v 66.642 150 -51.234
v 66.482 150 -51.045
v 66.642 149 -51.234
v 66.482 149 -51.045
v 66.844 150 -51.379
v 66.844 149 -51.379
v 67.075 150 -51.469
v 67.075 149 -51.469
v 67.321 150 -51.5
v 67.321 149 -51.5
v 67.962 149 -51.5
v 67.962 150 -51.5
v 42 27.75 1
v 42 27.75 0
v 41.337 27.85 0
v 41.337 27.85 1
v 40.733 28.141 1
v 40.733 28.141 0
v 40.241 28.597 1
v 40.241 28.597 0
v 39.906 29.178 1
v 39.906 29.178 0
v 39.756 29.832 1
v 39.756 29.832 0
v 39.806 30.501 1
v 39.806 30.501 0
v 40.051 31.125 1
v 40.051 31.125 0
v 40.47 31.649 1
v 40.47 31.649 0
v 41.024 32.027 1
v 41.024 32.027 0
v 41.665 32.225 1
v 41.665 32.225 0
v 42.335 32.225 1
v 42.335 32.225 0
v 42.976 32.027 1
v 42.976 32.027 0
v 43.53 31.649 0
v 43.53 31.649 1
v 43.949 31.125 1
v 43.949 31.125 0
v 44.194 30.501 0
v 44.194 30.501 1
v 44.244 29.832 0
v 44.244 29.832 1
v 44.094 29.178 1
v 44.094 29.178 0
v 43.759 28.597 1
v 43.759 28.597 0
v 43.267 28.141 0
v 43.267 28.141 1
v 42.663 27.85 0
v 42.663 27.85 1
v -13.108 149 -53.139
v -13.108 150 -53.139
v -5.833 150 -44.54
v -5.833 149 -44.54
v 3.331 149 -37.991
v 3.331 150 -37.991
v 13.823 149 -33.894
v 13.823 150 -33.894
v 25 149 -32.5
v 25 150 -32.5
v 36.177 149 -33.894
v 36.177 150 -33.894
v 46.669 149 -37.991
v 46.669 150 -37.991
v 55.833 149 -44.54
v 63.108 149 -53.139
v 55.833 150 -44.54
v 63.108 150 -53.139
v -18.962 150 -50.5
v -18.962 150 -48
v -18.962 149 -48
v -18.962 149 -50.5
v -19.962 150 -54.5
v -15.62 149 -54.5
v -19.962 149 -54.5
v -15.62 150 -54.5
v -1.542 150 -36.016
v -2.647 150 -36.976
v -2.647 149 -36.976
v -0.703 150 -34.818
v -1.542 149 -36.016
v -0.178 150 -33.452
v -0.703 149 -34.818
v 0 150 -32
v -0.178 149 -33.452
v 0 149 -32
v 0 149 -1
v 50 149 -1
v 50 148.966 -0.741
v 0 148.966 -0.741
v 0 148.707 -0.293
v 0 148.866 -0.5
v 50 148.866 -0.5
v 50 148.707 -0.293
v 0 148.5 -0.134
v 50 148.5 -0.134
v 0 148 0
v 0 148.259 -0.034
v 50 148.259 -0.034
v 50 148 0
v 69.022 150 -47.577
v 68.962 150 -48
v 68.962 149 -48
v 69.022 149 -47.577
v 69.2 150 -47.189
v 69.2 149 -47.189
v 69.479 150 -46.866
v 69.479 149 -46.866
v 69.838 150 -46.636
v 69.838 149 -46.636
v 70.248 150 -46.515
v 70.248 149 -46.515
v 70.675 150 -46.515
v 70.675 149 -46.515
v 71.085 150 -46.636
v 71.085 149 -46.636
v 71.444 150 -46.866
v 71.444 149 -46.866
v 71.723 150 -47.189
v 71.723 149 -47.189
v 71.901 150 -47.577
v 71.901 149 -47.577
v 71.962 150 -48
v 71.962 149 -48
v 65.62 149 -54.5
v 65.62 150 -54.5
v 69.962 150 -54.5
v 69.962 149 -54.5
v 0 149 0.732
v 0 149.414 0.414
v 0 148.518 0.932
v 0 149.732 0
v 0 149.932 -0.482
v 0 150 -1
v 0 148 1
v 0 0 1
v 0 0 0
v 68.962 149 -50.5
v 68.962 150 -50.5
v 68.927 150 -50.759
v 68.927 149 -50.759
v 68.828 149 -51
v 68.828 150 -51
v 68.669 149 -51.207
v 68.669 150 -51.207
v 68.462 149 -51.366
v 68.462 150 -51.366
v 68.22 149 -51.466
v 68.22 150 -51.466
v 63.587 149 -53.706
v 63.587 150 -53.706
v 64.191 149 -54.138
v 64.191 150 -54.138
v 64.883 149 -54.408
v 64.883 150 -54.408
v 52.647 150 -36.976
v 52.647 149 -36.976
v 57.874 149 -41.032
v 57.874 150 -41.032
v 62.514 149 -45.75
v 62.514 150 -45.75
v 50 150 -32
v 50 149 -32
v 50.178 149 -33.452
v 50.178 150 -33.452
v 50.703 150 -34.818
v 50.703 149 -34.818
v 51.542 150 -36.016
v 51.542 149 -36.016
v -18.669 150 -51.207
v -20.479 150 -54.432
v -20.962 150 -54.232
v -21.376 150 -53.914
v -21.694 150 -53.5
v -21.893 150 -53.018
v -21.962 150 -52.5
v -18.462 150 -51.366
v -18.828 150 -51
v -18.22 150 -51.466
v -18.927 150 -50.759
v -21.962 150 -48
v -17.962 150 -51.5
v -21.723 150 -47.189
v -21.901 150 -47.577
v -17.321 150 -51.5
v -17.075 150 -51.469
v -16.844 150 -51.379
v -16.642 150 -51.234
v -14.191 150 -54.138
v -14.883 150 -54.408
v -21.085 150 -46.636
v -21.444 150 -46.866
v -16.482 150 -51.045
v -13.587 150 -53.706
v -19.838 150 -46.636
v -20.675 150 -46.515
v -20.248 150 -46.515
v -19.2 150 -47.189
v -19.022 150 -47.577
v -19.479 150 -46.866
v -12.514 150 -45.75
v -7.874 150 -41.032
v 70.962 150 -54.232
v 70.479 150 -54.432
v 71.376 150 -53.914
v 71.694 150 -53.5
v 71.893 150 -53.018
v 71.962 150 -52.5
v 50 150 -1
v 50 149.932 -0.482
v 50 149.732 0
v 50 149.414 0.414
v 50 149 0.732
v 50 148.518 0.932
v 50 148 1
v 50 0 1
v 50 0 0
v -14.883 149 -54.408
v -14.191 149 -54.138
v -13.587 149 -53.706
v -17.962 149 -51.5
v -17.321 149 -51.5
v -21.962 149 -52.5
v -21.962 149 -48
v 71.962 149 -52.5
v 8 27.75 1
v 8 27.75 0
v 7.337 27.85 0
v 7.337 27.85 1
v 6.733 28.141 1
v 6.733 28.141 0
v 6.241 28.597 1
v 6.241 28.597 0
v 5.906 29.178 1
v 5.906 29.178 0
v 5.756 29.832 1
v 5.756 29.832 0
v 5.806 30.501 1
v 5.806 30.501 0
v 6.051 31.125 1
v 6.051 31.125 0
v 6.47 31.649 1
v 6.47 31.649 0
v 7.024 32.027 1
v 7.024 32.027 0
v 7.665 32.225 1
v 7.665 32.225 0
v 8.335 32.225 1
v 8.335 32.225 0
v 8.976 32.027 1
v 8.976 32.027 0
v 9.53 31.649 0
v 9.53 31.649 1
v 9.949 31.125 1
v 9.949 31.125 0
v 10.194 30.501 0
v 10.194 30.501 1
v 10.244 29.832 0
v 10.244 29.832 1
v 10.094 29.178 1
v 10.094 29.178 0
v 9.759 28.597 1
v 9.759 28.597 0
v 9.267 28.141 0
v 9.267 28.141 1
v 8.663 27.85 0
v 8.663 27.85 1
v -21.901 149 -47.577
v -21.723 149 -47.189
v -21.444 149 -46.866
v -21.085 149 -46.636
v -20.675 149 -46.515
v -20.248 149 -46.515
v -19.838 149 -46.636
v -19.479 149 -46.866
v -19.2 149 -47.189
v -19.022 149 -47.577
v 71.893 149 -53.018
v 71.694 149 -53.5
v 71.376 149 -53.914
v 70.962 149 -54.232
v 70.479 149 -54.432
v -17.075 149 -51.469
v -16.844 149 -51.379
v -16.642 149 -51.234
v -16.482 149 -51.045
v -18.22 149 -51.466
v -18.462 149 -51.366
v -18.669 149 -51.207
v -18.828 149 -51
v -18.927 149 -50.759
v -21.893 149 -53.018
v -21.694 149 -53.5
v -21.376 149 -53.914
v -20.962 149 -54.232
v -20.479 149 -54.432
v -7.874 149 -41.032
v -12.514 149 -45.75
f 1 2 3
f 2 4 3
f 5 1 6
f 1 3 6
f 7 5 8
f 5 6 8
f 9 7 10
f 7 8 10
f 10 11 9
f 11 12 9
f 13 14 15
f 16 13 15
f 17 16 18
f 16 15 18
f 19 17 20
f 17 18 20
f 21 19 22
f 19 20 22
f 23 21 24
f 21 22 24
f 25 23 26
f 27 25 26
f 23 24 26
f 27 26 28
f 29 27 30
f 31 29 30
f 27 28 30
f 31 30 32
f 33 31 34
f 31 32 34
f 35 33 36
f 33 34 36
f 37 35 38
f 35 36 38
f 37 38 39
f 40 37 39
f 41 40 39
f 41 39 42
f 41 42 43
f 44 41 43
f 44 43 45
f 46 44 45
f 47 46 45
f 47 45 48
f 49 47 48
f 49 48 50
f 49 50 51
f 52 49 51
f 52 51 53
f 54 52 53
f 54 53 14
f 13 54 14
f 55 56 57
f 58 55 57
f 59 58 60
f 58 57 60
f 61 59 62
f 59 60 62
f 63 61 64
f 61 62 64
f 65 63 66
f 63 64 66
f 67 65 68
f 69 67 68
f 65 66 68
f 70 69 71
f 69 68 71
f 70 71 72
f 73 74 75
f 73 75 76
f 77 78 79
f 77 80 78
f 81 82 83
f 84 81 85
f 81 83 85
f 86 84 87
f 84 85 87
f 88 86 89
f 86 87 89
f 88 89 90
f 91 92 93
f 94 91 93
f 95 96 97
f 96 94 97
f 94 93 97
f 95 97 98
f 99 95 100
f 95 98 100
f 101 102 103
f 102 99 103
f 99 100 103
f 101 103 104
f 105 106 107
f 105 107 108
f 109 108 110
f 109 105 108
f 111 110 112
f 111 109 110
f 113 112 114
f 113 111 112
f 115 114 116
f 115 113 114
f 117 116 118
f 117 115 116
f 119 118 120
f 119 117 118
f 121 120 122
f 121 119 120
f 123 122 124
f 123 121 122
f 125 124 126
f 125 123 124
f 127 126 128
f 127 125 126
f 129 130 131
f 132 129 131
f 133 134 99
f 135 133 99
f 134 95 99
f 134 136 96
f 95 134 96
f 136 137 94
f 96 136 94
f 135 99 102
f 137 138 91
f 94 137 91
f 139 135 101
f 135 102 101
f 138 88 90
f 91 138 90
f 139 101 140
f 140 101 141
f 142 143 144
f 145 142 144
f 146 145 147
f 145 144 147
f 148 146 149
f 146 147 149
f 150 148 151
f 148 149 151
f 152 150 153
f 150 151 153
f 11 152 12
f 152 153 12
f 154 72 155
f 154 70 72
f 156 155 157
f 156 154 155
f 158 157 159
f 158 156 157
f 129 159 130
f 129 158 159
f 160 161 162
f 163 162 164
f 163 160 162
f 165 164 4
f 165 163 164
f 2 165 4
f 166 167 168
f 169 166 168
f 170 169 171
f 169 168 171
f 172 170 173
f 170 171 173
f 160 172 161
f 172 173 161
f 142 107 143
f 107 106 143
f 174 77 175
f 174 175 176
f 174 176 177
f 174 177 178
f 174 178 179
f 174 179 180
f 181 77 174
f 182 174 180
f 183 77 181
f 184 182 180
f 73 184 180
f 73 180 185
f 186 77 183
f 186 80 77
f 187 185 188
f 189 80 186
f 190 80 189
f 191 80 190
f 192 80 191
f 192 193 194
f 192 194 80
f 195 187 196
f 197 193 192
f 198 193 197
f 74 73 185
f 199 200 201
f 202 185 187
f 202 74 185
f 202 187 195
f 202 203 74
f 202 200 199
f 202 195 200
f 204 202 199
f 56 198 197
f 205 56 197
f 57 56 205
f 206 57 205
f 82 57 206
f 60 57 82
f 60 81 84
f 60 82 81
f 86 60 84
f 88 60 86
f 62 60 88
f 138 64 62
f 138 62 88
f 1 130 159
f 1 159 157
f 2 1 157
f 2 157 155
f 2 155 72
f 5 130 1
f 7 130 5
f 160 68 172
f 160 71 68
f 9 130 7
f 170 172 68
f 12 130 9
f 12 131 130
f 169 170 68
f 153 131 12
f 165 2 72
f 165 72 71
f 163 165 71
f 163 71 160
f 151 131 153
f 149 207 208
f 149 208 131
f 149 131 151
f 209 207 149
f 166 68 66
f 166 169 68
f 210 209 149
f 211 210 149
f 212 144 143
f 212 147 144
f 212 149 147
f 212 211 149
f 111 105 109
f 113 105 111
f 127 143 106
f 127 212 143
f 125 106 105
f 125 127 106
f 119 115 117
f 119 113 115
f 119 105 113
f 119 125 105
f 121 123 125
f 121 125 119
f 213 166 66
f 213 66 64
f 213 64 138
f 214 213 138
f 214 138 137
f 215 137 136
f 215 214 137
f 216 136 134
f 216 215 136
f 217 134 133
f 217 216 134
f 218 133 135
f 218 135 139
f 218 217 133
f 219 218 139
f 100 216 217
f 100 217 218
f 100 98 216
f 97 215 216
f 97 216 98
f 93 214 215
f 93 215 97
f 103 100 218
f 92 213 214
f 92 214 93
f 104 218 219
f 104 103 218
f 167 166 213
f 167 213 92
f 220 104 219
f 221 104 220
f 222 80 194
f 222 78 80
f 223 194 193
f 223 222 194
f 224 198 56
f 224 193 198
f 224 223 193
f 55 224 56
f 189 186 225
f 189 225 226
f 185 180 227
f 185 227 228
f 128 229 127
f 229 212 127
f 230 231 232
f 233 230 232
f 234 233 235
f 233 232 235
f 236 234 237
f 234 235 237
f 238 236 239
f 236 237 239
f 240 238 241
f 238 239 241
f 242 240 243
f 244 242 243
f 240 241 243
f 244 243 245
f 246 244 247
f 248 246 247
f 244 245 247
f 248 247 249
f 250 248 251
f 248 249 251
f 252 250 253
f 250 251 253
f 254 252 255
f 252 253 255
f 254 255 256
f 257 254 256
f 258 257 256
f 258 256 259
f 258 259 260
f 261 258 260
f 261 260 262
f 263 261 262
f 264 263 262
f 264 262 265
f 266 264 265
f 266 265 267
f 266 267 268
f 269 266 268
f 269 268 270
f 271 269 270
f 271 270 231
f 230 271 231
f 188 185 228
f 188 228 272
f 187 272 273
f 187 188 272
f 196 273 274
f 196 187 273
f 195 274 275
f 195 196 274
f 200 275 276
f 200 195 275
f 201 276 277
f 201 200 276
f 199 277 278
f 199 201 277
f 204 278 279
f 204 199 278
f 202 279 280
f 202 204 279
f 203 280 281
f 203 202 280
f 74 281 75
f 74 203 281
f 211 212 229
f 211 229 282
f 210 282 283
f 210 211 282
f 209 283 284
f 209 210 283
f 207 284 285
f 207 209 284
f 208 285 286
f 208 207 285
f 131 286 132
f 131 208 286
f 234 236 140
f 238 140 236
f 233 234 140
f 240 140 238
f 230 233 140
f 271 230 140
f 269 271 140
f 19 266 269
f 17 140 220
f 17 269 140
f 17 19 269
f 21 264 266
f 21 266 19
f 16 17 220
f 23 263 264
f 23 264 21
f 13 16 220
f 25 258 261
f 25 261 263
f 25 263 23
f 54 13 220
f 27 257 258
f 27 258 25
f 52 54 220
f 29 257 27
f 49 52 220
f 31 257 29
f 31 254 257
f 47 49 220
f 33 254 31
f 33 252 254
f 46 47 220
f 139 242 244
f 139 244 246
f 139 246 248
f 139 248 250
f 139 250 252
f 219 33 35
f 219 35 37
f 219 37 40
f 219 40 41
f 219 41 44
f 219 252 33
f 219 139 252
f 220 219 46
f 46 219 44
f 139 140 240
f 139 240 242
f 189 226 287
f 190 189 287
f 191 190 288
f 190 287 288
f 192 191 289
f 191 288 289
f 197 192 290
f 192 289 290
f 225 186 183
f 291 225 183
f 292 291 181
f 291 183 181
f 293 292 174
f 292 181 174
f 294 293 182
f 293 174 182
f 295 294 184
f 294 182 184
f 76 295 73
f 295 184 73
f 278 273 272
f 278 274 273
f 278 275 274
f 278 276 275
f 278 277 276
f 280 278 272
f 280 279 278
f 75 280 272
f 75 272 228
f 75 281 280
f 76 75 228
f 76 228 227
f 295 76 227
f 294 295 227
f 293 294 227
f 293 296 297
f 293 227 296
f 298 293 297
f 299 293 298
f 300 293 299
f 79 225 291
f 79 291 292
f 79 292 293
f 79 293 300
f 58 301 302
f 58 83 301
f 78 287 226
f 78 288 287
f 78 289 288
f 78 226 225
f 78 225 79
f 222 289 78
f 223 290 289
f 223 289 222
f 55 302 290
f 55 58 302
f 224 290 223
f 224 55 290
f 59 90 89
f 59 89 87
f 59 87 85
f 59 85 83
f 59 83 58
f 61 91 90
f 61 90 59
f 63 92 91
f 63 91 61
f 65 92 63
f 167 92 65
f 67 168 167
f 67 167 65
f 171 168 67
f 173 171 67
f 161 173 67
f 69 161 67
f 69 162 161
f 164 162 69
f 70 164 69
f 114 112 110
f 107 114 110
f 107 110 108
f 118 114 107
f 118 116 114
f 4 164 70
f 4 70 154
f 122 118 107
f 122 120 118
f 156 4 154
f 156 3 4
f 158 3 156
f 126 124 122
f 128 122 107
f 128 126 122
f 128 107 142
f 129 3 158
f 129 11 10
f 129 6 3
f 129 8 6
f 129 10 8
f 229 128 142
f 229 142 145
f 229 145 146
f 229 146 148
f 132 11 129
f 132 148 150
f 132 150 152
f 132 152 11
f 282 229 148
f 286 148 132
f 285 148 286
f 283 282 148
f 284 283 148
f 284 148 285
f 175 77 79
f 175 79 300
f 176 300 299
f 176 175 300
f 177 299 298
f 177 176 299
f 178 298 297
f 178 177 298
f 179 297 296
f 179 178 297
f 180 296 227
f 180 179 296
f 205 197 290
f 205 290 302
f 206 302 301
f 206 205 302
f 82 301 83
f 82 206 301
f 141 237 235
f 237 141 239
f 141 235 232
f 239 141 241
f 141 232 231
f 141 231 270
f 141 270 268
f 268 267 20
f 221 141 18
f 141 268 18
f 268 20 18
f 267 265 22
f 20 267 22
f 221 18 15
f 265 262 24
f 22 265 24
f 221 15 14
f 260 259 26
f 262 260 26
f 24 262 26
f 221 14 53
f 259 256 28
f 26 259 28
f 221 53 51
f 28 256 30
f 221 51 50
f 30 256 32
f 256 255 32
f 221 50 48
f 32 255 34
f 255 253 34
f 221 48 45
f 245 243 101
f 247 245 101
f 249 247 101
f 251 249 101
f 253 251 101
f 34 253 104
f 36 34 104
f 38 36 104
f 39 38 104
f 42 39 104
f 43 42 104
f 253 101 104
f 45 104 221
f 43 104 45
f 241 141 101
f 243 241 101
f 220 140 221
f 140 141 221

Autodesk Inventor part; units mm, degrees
ref_plane "YZ Plane" through (0, 0, 0) normal (1, 0, 0) x (0, 1, 0)
ref_plane "XZ Plane" through (0, 0, 0) normal (0, 1, 0) x (-1, 0, 0)
ref_plane "XY Plane" through (0, 0, 0) normal (0, 0, 1) x (1, 0, 0)
sketch "Sketch1" plane through (0, 0, 0) normal (0, 0, 1) x (1, 0, 0)
  line L0 (0, 0) -> (50, 0)
  line L1 (50, 0) -> (50, 150)
  line L2 (50, 150) -> (0, 150)
  line L3 (0, 150) -> (0, 0)
  dimension "d0" = 50
  dimension "d1" = 150
extrude "Plate1" add sketch "Sketch1" along normal blind 1
sketch "Sketch2" plane through (50, 149, 1) normal (0, 1, 0) x (-1, 0, 0)
  line L0 (50, 0) -> (0, 0)
  line L1 (0, 0) -> (0, -79)
  line L2 (0, -79) -> (50, -79)
  line L3 (50, -79) -> (50, 0)
edge flange "Flange1" height 79 angle 90 thickness 1 bend radius 1 thickness toward (0, 1, 0) relief tear relief width 1 relief depth 0.5 edges at (25, 150, 0) wall of the first edge with corners at (0, 149, 1) (50, 149, 1) (50, 149, -78) (0, 149, -78)
bend "Bend1"
corner "Corner1"
sketch "Sketch4" plane through (0, 150, -78) normal (0, 1, 0) x (1, 0, 0)
  line L0 (0, 0) -> (50, 0)
  line L1 (0, 0) -> (-40, 0)
  line L2 (-40, 0) -> (-40, -40)
  line L3 (-40, -40) -> (0, -40)
  line L4 (0, -40) -> (0, 0)
  line L5 (50, -77) -> (50, 0)
  line L6 (50, 0) -> (90, 0)
  line L7 (90, 0) -> (90, -40)
  line L8 (90, -40) -> (50, -40)
  line L9 (50, -40) -> (50, 0)
  point P0 (0, -78)
  dimension "d14" = 40
  dimension "d15" = 40
  dimension "d16" = 40
  dimension "d17" = 40
sheet face with bend "Face2" sketch "Sketch4" thickness 1 toward (0, -1, 0) bend radius 1
bend "Bend2"
fillet "Corner Round7" radius 6 2 edges at (50, 149.5, -38) (0, 149.5, -38)
sketch "Sketch3" plane through (0, 150, -78) normal (0, 1, 0) x (1, 0, 0)
  line L0 (0, 0) -> (50, 0) projected
  circle A0 centre (25, 0) radius 45.5
  arc A1 (-16.7744, -26.5) -> (66.7744, -26.5) centre (25, 0) ccw
  arc A2 (0, -46) -> (-6, -40) centre (-6, -46) ccw projected
  circle A3 centre (-6, -46) radius 6
  arc A4 (56, -40) -> (50, -46) centre (56, -46) ccw projected
  circle A5 centre (56, -46) radius 6
  line L1 (-40, -40) -> (-6, -40) projected
  line L2 (-6, -40) -> (-40, -40)
  line L3 (-40, 0) -> (-40, -40) projected
  line L4 (-40, -40) -> (-40, 0)
  line L5 (-40, 0) -> (-20.5, 0)
  line L6 (90, 0) -> (-40, 0) projected
  line L7 (56, -40) -> (90, -40) projected
  line L8 (56, -40) -> (90, -40)
  line L9 (90, -40) -> (90, 0) projected
  line L10 (90, -40) -> (90, 0)
  line L11 (90, 0) -> (70.5, 0)
  line L12 (25, 0) -> (25, -45.5)
  line L13 (25, -45.5) -> (25, -23.5) construction
  line L14 (25, -23.5) -> (63.9615, -23.5) construction
  line L15 (63.9615, -23.5) -> (69.9615, -23.5)
  line L16 (63.9615, -23.5) -> (69.9615, -23.5) construction
  line L17 (71.9615, -25.5) -> (71.9615, -30)
  line L18 (70.4615, -31.5) -> (70.4615, -31.5)
  line L19 (25, -23.5) -> (-13.9615, -23.5) construction
  line L20 (-13.9615, -23.5) -> (-19.9615, -23.5)
  line L21 (-13.9615, -23.5) -> (-7.9615, -23.5) construction
  line L22 (-21.9615, -25.5) -> (-21.9615, -30)
  line L23 (-20.4615, -31.5) -> (-20.4615, -31.5)
  arc A6 (-16.7744, -26.5) -> (66.7744, -26.5) centre (25, 0) ccw
  line L24 (-18.9615, -30) -> (-18.9615, -27.5)
  line L25 (-17.9615, -26.5) -> (-16.7744, -26.5)
  line L26 (68.9615, -30) -> (68.9615, -27.5)
  line L27 (67.9615, -26.5) -> (66.7744, -26.5)
  arc A7 (-19.9615, -23.5) -> (-21.9615, -25.5) centre (-19.9615, -25.5) ccw
  arc A8 (-21.9615, -30) -> (-20.4615, -31.5) centre (-20.4615, -30) ccw
  arc A9 (-20.4615, -31.5) -> (-18.9615, -30) centre (-20.4615, -30) ccw
  arc A10 (-17.9615, -26.5) -> (-18.9615, -27.5) centre (-17.9615, -27.5) ccw
  arc A11 (71.9615, -25.5) -> (69.9615, -23.5) centre (69.9615, -25.5) ccw
  arc A12 (70.4615, -31.5) -> (71.9615, -30) centre (70.4615, -30) ccw
  arc A13 (68.9615, -30) -> (70.4615, -31.5) centre (70.4615, -30) ccw
  arc A14 (68.9615, -27.5) -> (67.9615, -26.5) centre (67.9615, -27.5) ccw
  point P0 (0, -78)
  point P1 (52.6469, -41.0244)
  point P2 (-2.6469, -41.0244)
  point P3 (71.9615, -23.5)
  point P4 (71.9615, -31.5)
  point P5 (68.9615, -31.5)
  point P6 (-21.9615, -23.5)
  point P7 (-21.9615, -31.5)
  point P8 (-18.9615, -31.5)
  point P9 (-18.9615, -26.5)
  point P10 (68.9615, -26.5)
  point P11 (-2.6469, -41.0244)
  point P12 (52.6469, -41.0244)
  point P13 (70.4615, -31.5)
  dimension "d13" = 91
  dimension "d84" = 22
  dimension "d85" = 8
  dimension "d86" = 0
  dimension "d87" = 8
  dimension "d88" = 3
  dimension "d89" = 8
  dimension "d90" = 180
  dimension "d91" = 8
  dimension "d92" = 90
  dimension "d93" = 3
  dimension "d95" = 5
  dimension "d96" = 5
  dimension "d97" = 2
  dimension "d98" = 1.5
  dimension "d99" = 1.5
  dimension "d100" = 1
  dimension "d101" = 2
  dimension "d102" = 1.5
  dimension "d103" = 1
extrude "Extrusion1" cut sketch "Sketch3" against normal through all contours L6 A0 L0 | L0 L12 A0 L6 | L0 L6 A0 L12 | A0 L20 A7 L22 A8 A9 L24 A10 L25 A1 A2 L1 L3 L5 | L6 L9 L7 A4 A1 L27 A14 L26 A13 A12 L17 A11 L15 A0
sketch "Sketch5" plane through (0, 150, -1) normal (0, 1, 0) x (1, 0, 0)
  arc A0 (-13.9615, 53.5) -> (63.9615, 53.5) centre (25, 77) ccw projected
  point P0 (0, -1)
  point P1 (70.5, 77)
  point P2 (-20.5, 77)
sketch "Sketch7" plane through (0, 0, 1) normal (0, 0, 1) x (1, 0, 0)
  line L0 (50, 0) -> (0, 0) projected
  line L1 (0, 0) -> (0, 148) projected
  line L2 (50, 148) -> (50, 0) projected
  point P0 (8, 30)
  point P1 (42, 30)
  dimension "d37" = 30
  dimension "d38" = 8
  dimension "d39" = 8
hole "Hole1" at (8, 30, 1) at (42, 30, 1) direction (0, 0, -1) diameter 4.5 end through all
fillet "Corner Round12" radius 1 1 edges at (-16.7744, 149.5, -51.5)
fillet "Corner Round13" radius 1 1 edges at (66.7744, 149.5, -51.5)
fillet "Corner Round14" radius 3 1 edges at (63.9615, 149.5, -54.5)
fillet "Corner Round15" radius 3 1 edges at (-13.9615, 149.5, -54.5)
sketch "Sketch10" plane through (0, 150, -1) normal (0, 1, 0) x (1, 0, 0)
  arc A0 (70.7921, 70.1608) -> (-20.7921, 70.1608) centre (25, 77) ccw
  line L0 (25, 77) -> (25, 30.7) construction
  line L1 (-17.3207, 50.5) -> (-17.9615, 50.5) projected
  line L2 (-18.9615, 47) -> (-18.9615, 49.5) projected
  line L3 (-17.6615, 49.2) -> (-20.7921, 70.1608)
  line L4 (-20.7921, 70.1608) -> (25, 70.1608) construction
  line L5 (68.9615, 49.5) -> (68.9615, 47) projected
  line L6 (67.3207, 50.5) -> (67.9615, 50.5) projected
  line L7 (67.6615, 49.2) -> (70.7921, 70.1608)
  line L8 (70.7921, 70.1608) -> (25, 70.1608) construction
  point P0 (0, -1)
  dimension "d109" = 92.6
  dimension "d115" = 1.3
  dimension "d116" = 1.3
  dimension "d117" = 45.7921
  dimension "d118" = 6.8392
  dimension "d119" = 1.3
  dimension "d120" = 1.3
  dimension "d121" = 45.7921
equation "\"d39\" = d38"
equation "\"d16\" = d14"
equation "\"d17\" = d15"
equation "\"d45\" = Thickness"
equation "\"d2\" = Thickness"
equation "\"d3\" = BendReliefWidth"
equation "\"d4\" = BendReliefDepth"
equation "\"d5\" = MinimumRemnant"
equation "\"d6\" = TransitionRadius"
equation "\"d9\" = BendRadius"
equation "\"d10\" = CornerReliefSize"
equation "\"d11\" = GapSize"
equation "\"d12\" = JacobiRadiusSize"
equation "\"d18\" = BendRadius"
equation "\"d19\" = BendReliefWidth"
equation "\"d21\" = MinimumRemnant"
equation "\"d20\" = BendReliefDepth"
equation "\"d22\" = TransitionRadius"
equation "\"BendRadius\" = Thickness"
equation "\"BendReliefWidth\" = Thickness"
equation "\"BendReliefDepth\" = 0.5 * Thickness"
equation "\"CornerReliefSize\" = 4 * Thickness"
equation "\"MinimumRemnant\" = 2 * Thickness"
equation "\"TransitionRadius\" = BendRadius"
equation "\"JacobiRadiusSize\" = BendRadius"
equation "\"GapSize\" = Thickness"
equation "\"Thickness\" = 1"
properties part number "Glass fixer plate" material "Steel, Carbon"
